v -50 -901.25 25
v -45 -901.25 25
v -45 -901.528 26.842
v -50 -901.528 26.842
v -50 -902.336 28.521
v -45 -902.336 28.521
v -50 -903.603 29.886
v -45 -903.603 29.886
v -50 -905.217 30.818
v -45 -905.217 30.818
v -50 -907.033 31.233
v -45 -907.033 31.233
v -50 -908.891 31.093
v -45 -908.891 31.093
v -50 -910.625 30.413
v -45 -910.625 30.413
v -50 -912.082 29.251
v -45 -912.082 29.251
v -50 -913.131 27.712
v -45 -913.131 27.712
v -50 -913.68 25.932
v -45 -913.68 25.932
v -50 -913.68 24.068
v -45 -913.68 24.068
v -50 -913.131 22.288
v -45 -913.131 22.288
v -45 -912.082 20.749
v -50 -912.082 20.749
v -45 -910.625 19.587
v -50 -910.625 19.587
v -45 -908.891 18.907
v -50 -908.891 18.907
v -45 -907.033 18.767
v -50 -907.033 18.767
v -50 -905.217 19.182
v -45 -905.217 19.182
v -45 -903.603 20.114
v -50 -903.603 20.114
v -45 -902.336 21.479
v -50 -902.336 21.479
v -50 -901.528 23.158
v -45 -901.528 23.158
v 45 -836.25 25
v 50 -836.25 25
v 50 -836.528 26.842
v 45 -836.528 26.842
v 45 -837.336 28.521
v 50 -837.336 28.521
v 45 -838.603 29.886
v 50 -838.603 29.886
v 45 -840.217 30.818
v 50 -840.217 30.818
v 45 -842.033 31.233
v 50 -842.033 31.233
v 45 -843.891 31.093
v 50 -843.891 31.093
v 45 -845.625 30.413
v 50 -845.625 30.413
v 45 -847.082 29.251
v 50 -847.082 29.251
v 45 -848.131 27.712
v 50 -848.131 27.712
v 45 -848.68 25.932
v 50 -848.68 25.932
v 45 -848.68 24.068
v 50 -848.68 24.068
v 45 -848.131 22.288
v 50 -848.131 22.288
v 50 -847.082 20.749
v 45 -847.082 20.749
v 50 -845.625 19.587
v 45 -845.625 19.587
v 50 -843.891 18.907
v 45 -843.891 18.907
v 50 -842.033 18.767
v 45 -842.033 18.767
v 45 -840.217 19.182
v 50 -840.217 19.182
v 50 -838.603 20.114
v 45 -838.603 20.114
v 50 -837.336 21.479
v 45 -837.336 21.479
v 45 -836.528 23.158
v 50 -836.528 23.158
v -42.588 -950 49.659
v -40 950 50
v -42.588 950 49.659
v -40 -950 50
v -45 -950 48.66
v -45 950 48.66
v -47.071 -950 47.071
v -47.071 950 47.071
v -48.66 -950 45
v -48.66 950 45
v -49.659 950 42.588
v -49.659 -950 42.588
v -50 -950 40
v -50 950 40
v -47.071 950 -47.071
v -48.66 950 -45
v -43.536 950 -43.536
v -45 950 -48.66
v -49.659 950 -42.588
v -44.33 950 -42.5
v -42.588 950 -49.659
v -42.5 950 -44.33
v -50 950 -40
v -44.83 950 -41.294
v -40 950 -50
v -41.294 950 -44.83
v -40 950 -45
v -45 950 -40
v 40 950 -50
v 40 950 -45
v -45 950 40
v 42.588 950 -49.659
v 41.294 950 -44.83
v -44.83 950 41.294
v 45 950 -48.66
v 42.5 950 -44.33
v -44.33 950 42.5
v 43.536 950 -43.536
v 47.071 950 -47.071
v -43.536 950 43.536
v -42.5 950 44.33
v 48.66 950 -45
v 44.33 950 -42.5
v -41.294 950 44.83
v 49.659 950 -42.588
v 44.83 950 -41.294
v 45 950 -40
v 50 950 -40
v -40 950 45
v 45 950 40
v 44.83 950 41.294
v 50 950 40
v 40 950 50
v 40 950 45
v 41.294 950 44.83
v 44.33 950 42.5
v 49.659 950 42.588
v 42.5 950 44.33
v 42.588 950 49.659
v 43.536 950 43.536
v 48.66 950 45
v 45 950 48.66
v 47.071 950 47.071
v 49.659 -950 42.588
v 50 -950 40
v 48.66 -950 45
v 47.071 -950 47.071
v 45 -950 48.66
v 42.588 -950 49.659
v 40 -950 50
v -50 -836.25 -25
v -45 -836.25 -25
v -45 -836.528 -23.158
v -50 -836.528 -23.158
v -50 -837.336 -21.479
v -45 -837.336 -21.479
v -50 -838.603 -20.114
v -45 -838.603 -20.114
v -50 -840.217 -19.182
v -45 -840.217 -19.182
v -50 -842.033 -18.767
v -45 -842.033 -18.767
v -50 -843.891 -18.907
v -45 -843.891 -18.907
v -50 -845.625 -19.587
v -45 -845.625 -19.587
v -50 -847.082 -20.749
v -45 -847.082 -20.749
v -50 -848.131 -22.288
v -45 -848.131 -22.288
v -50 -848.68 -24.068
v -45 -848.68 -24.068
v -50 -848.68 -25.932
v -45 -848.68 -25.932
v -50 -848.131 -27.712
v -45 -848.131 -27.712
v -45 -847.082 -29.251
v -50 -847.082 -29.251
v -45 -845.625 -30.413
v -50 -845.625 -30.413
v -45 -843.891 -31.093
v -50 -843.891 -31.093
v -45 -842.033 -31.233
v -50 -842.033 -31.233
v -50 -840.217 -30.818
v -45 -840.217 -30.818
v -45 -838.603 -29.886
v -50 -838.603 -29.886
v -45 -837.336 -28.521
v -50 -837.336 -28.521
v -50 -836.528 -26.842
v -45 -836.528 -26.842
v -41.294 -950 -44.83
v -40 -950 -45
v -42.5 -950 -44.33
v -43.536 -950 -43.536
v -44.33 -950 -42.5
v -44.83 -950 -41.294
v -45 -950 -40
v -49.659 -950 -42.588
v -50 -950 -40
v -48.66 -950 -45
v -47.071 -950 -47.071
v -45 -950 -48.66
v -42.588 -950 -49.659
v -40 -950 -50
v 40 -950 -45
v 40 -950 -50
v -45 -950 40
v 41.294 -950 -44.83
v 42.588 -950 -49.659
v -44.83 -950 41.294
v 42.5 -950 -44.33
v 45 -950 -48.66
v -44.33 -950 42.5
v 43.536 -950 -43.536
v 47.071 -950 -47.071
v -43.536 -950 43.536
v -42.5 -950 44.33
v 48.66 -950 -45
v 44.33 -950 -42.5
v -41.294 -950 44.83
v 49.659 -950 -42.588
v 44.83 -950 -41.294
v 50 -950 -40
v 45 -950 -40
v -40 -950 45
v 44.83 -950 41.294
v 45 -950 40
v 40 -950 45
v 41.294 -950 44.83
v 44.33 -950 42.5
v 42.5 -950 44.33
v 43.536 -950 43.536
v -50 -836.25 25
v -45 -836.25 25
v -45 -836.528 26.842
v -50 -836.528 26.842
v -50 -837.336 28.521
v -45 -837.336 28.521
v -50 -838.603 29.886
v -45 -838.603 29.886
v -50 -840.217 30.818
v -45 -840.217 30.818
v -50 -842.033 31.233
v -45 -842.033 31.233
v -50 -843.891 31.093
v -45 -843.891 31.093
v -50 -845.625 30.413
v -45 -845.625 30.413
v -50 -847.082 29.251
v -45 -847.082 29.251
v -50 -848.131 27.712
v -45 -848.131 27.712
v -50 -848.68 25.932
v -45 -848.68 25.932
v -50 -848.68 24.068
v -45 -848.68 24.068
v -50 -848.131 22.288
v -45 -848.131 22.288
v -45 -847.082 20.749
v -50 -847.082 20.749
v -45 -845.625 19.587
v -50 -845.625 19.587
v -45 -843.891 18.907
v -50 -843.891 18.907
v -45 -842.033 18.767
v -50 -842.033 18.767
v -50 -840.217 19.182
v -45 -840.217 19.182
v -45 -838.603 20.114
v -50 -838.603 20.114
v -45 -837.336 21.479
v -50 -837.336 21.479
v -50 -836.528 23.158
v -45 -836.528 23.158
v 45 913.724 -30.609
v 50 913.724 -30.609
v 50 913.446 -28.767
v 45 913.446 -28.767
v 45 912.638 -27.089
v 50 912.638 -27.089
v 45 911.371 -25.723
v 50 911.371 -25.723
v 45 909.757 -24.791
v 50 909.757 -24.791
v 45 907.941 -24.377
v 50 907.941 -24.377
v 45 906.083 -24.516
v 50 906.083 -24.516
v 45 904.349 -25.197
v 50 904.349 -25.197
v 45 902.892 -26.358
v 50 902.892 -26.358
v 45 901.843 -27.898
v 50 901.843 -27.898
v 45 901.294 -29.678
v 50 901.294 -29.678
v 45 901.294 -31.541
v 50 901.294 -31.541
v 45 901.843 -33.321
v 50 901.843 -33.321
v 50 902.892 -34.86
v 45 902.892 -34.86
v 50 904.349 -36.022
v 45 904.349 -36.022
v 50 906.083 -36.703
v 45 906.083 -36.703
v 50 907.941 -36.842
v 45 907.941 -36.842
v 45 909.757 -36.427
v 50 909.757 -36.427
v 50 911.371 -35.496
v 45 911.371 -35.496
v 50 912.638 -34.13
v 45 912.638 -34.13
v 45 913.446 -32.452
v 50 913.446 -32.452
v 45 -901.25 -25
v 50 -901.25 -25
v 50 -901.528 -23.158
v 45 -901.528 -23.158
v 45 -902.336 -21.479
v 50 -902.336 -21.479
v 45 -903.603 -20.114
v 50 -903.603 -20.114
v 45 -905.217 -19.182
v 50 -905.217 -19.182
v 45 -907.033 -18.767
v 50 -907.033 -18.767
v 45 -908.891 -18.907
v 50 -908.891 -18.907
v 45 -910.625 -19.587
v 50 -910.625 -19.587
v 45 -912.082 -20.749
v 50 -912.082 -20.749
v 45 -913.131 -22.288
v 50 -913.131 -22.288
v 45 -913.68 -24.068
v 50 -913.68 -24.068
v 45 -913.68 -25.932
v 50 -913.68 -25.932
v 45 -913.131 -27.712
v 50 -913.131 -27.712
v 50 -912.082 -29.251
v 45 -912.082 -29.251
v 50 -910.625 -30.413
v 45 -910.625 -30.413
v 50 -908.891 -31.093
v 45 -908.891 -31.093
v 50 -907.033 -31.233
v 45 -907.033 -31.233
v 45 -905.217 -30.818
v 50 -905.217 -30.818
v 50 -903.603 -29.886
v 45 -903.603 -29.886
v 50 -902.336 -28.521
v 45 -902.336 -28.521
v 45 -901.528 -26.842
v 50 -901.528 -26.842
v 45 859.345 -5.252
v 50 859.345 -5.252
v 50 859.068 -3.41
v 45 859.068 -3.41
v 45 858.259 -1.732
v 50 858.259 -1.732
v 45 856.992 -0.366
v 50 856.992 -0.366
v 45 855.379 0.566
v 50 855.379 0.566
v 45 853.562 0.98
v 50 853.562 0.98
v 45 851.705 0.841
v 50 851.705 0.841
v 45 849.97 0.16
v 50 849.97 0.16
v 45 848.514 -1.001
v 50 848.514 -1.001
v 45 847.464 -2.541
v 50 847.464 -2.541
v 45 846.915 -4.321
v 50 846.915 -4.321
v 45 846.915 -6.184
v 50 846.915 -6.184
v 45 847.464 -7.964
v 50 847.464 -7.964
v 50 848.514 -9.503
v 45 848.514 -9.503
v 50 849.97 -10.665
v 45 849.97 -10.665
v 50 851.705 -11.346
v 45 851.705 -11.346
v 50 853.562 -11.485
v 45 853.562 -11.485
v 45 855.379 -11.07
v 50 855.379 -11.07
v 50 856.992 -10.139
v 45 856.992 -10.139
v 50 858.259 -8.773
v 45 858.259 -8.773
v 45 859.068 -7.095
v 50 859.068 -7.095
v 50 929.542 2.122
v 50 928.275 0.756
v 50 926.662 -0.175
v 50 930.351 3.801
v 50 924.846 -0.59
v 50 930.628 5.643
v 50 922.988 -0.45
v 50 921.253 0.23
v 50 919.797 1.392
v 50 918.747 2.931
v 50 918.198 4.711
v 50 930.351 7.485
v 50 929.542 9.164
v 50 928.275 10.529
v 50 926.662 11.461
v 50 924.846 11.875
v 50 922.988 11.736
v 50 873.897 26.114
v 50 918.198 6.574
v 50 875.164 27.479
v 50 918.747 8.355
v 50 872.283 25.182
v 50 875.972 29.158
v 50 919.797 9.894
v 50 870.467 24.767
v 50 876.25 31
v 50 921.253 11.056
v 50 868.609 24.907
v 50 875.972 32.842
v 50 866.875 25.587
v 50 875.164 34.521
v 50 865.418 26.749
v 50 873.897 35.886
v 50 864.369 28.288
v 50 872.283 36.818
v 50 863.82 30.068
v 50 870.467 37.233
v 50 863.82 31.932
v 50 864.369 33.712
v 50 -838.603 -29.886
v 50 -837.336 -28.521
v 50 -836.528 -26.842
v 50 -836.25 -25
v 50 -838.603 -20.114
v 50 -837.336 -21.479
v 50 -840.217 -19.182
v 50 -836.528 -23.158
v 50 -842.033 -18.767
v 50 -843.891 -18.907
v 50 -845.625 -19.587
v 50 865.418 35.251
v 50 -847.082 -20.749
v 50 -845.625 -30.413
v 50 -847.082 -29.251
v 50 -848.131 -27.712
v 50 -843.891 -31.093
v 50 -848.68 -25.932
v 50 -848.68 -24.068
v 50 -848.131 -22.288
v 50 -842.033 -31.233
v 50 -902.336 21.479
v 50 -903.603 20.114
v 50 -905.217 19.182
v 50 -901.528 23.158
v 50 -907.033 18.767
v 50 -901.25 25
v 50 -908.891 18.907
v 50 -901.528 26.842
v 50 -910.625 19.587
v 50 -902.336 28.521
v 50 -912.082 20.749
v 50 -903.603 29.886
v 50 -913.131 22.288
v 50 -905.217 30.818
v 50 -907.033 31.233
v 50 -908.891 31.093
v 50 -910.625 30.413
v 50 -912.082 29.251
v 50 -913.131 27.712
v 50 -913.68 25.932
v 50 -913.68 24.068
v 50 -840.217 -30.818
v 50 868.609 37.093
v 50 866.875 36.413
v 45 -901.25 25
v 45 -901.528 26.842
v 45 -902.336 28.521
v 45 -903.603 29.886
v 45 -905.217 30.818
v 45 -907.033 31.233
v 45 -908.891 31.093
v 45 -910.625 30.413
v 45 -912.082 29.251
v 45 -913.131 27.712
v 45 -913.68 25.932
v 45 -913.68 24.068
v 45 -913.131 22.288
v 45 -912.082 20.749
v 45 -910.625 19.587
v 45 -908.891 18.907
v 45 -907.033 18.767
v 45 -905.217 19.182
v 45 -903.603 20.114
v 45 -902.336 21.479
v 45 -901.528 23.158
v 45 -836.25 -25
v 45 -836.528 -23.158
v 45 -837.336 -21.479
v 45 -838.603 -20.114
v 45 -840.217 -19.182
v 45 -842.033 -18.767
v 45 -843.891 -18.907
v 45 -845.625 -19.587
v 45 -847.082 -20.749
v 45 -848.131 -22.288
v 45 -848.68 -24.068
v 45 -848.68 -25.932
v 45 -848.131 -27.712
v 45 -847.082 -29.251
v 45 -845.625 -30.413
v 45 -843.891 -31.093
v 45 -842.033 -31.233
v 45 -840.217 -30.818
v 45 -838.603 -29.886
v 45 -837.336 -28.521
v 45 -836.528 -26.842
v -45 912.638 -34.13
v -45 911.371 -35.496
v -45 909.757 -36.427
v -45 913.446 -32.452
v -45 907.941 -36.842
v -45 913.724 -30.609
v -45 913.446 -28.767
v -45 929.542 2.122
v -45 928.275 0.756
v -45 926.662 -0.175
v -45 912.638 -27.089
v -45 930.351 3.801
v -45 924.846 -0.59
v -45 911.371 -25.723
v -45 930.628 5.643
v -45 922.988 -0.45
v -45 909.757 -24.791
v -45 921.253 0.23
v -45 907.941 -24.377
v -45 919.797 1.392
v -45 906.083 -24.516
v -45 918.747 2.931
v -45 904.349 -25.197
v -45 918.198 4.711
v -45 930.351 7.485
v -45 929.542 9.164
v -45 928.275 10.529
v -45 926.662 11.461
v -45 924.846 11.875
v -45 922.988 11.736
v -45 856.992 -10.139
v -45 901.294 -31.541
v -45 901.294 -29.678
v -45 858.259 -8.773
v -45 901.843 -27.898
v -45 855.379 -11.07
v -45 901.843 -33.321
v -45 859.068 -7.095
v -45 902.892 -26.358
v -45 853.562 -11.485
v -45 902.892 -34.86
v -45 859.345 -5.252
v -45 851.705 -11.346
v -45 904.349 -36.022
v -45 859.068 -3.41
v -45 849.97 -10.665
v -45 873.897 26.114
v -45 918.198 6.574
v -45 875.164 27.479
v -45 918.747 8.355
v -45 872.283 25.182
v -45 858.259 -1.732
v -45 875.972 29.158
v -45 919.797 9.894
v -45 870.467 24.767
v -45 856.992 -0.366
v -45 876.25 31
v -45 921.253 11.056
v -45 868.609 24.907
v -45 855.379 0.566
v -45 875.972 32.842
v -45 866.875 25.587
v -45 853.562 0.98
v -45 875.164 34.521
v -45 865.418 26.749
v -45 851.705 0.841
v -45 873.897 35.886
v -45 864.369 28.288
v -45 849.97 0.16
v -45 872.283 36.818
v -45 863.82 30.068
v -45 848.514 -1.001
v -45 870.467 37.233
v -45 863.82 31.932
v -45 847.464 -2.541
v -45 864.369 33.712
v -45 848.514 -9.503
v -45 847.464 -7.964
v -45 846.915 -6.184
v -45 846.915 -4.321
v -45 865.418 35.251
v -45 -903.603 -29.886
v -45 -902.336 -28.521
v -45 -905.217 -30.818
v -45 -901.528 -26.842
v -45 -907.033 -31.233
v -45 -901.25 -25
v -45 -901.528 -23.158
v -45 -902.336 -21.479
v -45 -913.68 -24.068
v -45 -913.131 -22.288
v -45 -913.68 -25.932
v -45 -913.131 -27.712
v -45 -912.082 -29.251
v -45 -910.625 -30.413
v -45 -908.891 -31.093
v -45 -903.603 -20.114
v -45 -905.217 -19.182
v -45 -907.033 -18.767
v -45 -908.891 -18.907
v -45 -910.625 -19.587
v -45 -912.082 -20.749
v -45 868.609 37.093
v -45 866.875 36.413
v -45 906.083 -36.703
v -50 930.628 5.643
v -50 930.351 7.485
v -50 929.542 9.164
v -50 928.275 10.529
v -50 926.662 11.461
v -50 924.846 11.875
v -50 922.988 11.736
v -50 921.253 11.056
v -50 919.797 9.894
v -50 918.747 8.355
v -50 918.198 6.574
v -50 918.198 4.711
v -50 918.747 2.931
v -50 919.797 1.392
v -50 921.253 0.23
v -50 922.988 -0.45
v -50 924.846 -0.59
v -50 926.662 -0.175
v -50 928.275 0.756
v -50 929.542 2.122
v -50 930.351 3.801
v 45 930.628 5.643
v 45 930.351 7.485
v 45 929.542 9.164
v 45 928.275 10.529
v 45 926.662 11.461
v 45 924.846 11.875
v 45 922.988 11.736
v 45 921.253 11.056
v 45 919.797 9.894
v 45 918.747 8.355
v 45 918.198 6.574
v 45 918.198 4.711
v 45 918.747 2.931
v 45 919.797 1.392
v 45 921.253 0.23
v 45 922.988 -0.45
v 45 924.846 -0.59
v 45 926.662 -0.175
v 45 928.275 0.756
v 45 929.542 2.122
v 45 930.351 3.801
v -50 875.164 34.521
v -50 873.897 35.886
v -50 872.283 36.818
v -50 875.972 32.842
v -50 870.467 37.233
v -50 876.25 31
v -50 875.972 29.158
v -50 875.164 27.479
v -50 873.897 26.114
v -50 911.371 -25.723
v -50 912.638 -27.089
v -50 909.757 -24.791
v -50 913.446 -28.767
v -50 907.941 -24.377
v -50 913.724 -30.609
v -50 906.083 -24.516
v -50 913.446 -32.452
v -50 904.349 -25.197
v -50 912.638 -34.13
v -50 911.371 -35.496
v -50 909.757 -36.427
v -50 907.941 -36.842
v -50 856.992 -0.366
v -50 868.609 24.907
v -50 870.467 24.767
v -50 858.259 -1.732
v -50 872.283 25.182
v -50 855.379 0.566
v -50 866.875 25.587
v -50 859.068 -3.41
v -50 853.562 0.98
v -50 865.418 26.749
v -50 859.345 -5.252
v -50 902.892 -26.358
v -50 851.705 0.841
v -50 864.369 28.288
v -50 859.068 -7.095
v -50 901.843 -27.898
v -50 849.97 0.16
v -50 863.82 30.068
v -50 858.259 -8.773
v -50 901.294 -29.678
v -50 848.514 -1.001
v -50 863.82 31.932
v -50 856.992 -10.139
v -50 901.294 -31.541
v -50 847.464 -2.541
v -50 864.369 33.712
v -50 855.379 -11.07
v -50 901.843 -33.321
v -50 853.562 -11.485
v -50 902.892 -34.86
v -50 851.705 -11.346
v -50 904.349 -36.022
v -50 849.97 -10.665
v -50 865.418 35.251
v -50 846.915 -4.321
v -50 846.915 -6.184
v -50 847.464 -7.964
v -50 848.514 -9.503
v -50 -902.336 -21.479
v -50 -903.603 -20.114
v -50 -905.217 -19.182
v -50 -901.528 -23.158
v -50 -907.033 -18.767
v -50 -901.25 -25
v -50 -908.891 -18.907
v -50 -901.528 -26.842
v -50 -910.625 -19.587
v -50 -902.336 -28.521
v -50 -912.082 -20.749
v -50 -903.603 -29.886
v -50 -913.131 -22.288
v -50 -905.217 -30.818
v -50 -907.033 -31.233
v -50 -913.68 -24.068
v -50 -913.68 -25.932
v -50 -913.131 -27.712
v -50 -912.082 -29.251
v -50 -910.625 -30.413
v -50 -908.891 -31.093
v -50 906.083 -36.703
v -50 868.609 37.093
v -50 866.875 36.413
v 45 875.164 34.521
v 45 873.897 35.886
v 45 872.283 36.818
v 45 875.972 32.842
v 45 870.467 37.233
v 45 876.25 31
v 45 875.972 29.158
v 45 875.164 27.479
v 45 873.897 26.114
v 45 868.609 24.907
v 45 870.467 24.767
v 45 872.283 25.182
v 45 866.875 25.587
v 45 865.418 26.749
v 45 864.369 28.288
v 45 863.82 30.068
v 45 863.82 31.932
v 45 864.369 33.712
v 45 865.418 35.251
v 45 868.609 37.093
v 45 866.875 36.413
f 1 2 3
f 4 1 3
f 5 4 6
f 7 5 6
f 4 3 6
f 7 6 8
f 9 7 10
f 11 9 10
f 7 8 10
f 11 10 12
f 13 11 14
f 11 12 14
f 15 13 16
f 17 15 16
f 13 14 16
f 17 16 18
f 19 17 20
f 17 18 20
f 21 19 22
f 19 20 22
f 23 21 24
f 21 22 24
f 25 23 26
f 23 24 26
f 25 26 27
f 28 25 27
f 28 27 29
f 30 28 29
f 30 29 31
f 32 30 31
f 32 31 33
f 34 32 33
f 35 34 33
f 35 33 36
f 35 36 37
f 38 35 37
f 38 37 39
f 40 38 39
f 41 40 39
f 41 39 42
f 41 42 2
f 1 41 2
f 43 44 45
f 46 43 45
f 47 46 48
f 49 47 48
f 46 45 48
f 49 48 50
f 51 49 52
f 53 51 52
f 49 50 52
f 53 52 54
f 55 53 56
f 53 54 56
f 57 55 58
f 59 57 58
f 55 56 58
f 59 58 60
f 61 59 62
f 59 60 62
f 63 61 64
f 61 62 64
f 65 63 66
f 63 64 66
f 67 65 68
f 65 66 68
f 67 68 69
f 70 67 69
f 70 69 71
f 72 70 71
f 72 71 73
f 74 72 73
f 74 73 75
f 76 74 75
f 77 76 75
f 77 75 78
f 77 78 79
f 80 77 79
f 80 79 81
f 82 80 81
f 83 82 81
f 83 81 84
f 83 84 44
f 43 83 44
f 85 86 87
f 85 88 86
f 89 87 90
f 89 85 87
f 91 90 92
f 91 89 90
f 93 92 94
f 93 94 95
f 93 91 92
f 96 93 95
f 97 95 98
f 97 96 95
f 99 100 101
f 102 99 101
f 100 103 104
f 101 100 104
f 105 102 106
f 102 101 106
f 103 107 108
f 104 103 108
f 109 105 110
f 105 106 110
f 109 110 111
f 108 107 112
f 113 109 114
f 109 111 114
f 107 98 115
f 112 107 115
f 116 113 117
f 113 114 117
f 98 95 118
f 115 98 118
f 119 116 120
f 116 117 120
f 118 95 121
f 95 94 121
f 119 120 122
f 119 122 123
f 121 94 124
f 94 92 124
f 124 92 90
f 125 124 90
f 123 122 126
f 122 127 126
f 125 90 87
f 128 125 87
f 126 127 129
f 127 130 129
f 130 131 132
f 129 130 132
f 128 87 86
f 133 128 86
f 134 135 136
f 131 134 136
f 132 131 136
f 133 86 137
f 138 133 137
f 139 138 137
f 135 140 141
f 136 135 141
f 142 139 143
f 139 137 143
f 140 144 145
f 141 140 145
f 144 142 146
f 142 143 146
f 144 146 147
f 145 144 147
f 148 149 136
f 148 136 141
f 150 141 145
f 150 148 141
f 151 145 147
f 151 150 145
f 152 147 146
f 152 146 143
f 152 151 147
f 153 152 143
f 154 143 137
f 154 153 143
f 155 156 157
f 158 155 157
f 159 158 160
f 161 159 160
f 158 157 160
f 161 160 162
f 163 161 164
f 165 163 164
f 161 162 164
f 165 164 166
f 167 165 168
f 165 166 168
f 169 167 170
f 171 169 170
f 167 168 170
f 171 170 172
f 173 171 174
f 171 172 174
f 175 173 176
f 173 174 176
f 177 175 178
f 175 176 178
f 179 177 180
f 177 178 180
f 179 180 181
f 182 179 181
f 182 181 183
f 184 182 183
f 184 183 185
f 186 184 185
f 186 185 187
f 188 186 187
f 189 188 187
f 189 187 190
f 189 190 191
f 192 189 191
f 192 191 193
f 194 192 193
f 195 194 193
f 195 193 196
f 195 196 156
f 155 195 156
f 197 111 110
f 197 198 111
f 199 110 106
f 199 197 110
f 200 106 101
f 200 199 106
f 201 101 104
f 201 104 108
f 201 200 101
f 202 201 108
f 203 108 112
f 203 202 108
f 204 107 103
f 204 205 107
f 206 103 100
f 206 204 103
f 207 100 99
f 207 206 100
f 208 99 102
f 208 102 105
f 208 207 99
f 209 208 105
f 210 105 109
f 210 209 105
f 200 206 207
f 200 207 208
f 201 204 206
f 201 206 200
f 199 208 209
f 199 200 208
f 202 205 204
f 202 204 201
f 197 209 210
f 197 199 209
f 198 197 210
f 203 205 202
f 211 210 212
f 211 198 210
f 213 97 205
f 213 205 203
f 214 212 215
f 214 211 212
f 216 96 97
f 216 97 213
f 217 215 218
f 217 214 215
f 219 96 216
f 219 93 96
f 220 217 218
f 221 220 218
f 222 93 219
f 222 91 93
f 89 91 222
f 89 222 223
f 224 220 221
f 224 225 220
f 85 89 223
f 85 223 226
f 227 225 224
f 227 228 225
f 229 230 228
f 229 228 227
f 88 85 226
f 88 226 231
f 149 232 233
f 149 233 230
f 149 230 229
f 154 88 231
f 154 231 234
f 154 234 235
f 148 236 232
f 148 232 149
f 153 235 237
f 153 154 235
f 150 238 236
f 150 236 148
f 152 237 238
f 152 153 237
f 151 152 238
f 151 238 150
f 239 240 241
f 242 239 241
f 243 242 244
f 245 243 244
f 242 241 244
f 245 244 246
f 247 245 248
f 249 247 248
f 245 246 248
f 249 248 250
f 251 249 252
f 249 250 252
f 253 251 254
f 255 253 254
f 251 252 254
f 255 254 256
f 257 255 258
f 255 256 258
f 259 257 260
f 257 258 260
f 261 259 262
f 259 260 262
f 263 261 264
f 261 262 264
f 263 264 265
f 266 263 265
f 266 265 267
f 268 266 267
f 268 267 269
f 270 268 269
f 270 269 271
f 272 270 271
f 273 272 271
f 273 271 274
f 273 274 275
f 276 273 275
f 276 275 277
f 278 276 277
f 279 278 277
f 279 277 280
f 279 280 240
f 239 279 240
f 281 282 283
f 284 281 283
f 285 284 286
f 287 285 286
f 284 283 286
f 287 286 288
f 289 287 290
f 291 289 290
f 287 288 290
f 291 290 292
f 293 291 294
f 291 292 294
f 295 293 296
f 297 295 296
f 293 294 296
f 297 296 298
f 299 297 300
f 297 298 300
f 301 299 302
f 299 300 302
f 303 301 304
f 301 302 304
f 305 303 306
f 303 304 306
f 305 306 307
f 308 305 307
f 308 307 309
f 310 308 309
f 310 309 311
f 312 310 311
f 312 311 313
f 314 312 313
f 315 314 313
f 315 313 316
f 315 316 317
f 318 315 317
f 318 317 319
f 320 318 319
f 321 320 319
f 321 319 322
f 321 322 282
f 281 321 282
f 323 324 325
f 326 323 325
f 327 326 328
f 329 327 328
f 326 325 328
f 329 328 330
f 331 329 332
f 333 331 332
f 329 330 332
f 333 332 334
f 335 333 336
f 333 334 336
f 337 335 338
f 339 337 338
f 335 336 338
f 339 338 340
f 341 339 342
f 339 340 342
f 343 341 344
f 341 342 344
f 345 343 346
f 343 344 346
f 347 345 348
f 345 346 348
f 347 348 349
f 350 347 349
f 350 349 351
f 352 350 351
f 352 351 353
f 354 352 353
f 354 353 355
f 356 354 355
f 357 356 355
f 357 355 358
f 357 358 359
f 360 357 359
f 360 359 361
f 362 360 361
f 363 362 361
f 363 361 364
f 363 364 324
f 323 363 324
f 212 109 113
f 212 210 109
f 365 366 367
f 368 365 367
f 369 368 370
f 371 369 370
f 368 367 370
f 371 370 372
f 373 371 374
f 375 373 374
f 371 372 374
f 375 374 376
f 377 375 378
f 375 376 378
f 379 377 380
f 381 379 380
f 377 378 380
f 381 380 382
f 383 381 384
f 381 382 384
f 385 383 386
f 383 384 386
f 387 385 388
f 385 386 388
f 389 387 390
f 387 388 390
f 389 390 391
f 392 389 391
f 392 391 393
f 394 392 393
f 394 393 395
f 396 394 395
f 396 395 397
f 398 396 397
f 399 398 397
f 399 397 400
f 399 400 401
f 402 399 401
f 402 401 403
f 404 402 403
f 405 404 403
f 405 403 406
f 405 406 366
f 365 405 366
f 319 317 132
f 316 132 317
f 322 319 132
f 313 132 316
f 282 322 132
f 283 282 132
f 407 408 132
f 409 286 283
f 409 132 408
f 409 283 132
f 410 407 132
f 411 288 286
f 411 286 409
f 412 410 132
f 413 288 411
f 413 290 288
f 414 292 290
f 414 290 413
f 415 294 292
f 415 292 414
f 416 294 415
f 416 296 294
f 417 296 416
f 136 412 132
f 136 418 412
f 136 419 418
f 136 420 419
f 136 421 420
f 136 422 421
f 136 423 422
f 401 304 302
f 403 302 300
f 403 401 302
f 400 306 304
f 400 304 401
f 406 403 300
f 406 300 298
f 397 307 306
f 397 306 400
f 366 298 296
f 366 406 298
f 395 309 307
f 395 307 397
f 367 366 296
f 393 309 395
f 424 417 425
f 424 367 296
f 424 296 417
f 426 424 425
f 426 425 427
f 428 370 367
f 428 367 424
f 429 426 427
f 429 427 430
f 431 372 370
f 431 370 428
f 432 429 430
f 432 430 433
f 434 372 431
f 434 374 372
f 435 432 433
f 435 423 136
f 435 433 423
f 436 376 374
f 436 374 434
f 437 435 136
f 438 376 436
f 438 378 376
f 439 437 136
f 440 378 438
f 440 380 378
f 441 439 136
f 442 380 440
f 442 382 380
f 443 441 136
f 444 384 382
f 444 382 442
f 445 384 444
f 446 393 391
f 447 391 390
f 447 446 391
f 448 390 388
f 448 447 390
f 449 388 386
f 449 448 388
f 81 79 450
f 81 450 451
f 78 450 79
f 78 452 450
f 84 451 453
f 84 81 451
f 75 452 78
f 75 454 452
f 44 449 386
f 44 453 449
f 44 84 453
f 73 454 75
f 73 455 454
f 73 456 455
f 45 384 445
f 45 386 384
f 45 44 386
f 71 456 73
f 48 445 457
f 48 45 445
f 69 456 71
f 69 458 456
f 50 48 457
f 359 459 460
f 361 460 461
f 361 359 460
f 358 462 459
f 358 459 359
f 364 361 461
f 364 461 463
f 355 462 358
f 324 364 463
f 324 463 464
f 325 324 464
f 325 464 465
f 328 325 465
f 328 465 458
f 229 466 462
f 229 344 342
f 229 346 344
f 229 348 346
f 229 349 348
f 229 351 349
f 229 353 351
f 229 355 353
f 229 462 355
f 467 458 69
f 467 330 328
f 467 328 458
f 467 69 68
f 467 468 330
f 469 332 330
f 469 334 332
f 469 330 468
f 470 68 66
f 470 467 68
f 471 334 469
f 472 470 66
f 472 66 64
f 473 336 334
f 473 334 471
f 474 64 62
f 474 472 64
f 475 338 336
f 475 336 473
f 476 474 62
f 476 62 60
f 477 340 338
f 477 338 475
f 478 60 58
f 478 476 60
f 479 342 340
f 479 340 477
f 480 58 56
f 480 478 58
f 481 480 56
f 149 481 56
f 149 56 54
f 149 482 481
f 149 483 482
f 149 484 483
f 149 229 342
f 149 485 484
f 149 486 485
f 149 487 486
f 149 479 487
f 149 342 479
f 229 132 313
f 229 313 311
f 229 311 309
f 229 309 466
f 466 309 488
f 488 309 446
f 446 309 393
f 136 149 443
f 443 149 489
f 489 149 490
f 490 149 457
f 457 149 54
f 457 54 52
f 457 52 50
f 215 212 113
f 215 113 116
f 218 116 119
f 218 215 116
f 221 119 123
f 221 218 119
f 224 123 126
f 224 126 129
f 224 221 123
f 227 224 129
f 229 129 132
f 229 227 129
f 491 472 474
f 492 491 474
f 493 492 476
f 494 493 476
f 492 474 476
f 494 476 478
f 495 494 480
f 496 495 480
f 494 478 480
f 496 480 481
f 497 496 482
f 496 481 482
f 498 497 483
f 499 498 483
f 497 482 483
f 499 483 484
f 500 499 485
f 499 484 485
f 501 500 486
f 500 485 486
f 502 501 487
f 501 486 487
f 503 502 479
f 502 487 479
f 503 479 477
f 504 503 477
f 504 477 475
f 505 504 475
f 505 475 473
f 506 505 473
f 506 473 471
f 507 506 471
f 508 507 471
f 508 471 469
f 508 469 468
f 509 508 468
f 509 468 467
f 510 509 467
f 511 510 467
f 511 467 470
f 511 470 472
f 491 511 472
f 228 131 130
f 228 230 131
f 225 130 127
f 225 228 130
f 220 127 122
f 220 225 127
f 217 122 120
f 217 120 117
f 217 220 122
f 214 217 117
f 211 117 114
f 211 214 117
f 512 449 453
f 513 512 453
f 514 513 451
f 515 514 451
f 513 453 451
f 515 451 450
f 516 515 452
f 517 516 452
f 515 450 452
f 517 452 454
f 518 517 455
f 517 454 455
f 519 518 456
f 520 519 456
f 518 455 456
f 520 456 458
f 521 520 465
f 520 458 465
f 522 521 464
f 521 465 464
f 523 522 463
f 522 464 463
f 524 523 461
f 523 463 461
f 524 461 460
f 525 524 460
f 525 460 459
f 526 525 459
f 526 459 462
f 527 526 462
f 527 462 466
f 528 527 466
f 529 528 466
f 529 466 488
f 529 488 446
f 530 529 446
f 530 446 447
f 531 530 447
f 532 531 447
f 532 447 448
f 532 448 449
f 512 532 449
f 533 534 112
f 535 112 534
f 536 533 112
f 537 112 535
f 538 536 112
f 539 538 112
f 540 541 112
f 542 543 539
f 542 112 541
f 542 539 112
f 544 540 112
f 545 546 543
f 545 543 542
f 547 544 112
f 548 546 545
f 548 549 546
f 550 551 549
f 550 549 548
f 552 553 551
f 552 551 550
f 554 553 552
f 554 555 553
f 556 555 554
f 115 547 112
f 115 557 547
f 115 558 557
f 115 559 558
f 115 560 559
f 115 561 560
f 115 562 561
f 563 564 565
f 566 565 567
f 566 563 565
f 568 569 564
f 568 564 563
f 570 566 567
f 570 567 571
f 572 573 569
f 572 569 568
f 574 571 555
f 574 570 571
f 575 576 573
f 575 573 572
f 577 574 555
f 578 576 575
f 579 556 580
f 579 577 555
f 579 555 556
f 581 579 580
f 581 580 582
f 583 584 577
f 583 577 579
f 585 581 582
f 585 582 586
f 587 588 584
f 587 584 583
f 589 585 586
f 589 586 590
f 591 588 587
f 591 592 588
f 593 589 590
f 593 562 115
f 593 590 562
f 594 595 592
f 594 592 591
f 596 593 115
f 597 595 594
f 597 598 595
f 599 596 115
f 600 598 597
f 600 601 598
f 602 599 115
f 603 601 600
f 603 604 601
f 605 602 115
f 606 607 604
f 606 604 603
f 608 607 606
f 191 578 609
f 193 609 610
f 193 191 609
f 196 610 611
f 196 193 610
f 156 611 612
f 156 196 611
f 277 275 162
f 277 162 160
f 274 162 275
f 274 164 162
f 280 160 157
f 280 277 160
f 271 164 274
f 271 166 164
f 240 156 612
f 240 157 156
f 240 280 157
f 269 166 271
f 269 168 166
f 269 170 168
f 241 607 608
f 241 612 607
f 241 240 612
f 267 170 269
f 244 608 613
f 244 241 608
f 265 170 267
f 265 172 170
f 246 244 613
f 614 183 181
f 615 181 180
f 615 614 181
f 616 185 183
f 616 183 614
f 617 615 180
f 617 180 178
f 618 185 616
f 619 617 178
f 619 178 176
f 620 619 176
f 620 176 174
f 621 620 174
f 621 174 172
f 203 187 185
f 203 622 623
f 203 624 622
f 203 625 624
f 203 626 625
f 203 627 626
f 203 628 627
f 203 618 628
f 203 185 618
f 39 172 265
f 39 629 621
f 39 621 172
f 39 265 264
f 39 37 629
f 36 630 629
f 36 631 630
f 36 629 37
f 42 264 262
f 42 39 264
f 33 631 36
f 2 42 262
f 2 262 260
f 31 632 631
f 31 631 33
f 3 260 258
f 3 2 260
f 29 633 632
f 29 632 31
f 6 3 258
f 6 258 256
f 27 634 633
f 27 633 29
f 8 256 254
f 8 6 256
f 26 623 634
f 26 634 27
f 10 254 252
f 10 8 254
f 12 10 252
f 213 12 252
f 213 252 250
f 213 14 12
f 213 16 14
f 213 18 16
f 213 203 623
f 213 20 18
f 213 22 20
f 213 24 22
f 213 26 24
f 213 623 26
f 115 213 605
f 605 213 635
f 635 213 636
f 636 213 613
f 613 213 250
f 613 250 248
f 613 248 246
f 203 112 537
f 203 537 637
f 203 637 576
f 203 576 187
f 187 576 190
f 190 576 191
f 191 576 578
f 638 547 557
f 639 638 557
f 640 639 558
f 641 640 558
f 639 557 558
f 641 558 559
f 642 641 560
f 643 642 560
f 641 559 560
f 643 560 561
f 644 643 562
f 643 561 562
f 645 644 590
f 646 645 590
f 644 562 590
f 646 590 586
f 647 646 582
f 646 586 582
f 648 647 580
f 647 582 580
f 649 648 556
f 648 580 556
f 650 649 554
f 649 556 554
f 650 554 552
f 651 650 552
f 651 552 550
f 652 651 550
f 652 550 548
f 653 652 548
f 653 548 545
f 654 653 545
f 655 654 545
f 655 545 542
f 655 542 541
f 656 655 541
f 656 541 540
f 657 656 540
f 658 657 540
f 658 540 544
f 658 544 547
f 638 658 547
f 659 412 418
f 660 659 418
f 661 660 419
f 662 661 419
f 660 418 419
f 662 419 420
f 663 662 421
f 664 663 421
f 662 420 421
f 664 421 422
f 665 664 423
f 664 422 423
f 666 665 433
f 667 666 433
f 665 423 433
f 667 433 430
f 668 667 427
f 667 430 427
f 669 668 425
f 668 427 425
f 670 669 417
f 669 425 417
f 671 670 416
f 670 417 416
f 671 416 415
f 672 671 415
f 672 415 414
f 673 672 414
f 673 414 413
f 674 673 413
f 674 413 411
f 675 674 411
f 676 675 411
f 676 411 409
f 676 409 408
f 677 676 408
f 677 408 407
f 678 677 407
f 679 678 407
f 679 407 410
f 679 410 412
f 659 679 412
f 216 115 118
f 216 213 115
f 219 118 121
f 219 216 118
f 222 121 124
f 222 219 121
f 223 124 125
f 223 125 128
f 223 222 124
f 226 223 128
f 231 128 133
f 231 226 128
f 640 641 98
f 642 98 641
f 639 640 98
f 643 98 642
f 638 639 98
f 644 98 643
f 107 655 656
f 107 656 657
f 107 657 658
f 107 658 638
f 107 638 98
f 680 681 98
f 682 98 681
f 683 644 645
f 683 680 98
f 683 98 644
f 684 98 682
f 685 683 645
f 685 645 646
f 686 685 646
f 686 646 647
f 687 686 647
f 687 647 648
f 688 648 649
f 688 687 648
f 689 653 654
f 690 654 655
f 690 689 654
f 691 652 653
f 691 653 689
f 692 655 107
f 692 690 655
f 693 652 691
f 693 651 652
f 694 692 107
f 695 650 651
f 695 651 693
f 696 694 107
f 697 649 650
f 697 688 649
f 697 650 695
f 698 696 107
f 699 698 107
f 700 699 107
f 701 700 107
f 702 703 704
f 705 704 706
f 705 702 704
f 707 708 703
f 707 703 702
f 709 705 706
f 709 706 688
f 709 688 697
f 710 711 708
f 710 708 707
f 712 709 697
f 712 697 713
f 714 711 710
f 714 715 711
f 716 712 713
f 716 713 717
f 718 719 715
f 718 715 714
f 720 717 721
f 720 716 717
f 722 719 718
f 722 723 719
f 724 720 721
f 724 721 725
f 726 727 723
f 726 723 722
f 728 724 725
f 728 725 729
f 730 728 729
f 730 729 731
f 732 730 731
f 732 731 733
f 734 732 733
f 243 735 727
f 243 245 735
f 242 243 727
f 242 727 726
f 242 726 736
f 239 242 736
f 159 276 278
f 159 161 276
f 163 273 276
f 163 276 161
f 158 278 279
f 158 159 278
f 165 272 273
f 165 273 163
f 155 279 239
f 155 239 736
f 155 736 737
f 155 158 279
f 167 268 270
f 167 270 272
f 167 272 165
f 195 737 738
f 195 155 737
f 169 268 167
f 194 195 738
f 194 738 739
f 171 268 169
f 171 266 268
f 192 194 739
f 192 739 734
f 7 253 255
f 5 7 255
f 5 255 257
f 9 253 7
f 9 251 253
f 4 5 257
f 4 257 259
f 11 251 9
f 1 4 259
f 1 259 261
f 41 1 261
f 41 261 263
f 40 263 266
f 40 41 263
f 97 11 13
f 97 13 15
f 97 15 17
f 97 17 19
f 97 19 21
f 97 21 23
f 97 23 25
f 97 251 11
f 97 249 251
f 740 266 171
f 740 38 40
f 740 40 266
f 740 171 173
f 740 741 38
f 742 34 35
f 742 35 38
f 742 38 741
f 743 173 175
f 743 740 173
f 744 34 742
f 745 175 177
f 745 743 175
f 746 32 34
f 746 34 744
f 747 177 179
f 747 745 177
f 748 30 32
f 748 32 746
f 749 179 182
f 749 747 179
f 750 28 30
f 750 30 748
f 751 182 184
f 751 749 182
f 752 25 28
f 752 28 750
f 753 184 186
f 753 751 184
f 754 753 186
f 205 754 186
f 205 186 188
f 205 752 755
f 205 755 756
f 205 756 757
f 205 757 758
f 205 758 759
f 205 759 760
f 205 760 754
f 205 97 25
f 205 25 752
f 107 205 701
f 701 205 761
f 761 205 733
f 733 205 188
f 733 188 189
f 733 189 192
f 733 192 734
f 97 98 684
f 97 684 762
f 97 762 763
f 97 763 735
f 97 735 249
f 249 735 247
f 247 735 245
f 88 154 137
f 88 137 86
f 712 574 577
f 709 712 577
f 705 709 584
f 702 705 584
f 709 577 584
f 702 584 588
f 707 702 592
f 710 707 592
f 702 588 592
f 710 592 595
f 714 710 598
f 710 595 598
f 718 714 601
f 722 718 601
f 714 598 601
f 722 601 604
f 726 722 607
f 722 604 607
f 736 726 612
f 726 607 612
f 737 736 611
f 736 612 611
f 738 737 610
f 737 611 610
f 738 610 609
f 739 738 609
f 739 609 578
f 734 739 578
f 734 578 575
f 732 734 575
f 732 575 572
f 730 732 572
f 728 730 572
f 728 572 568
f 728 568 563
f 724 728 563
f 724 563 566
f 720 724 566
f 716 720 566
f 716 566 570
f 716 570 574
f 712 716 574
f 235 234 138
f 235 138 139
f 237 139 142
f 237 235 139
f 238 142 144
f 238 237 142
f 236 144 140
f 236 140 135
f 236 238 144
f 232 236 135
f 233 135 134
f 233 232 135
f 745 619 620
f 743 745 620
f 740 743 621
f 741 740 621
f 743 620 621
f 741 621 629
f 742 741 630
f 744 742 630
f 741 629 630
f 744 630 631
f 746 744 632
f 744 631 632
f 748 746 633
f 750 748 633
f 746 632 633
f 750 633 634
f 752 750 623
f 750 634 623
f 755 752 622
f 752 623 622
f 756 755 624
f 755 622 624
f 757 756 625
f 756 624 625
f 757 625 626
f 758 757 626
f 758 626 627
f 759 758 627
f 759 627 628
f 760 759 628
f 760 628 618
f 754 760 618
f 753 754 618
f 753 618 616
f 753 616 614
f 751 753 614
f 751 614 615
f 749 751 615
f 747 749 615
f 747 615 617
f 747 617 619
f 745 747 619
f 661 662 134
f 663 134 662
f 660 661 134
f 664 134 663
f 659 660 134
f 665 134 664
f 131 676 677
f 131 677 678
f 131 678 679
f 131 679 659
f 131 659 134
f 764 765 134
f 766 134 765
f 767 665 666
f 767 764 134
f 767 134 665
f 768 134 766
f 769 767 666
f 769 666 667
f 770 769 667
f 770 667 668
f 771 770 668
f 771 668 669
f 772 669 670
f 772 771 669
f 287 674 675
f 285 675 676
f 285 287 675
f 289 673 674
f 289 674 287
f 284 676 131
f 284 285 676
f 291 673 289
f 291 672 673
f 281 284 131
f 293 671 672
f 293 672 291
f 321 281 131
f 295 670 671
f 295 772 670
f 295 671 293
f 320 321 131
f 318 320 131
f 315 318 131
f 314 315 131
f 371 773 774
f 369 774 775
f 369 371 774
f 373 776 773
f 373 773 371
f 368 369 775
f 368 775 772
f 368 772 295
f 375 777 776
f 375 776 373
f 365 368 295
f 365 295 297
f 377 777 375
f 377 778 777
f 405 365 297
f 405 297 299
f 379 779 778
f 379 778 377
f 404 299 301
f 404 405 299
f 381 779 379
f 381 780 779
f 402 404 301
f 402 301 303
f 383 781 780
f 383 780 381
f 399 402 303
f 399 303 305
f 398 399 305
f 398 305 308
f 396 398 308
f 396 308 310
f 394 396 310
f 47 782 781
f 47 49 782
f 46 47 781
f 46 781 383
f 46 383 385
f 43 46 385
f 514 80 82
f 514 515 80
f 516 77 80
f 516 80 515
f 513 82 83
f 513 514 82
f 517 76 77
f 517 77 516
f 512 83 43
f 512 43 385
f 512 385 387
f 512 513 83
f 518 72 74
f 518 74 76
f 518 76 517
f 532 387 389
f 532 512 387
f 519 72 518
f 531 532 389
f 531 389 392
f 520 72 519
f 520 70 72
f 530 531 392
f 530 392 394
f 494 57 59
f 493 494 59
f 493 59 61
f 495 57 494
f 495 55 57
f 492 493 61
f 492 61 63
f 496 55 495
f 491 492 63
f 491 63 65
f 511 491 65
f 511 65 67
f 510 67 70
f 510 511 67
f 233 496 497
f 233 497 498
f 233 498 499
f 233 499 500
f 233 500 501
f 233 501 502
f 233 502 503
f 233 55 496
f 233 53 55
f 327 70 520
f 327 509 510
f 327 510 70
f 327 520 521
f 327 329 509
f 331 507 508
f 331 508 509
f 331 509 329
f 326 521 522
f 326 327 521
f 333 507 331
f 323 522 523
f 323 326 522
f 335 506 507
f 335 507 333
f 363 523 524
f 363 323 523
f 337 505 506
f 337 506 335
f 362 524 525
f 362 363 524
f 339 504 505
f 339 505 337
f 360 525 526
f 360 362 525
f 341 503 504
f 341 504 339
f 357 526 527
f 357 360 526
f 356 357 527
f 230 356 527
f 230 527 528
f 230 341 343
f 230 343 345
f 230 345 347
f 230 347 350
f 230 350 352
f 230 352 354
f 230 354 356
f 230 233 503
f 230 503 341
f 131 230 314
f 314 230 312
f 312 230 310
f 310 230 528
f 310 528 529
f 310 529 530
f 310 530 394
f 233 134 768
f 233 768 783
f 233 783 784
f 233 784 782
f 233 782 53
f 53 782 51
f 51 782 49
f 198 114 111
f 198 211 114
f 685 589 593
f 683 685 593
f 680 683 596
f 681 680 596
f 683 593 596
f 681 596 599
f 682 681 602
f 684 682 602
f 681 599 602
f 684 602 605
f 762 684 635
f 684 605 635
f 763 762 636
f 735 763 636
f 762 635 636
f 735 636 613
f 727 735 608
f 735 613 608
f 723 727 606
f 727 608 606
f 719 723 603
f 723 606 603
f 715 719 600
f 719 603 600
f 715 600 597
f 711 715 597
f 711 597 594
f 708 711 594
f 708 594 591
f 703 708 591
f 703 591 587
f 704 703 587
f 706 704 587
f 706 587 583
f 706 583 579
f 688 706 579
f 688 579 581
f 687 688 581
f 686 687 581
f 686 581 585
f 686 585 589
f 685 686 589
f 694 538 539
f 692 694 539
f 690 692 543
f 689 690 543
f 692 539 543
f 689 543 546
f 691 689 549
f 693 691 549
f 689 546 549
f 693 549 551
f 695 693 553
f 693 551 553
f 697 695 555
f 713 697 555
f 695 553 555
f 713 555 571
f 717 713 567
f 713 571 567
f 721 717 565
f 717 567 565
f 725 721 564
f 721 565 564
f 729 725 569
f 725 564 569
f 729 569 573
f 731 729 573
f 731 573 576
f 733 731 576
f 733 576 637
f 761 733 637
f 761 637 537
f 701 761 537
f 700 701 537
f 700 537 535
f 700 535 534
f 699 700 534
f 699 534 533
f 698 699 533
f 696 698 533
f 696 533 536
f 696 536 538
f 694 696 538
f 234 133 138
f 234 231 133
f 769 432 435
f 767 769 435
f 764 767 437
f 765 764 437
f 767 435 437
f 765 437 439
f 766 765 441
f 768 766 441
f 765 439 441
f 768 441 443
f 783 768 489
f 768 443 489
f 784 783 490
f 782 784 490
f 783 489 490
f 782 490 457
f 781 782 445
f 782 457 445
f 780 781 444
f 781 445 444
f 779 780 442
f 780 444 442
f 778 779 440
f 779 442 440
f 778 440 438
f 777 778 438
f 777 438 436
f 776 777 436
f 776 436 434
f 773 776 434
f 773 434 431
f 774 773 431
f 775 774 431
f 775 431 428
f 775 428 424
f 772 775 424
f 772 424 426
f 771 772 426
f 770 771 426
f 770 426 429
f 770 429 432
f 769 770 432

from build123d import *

# Parameters (mm, degrees)
F1_DEPTH = 950
F2_R     = 6.25
F3_DEPTH = 100.001
F4_R     = 6.25
F5_DEPTH = 100.001


with BuildPart() as f1:
    # F0 (on Front) → F1 (new body, symmetric)
    with BuildSketch(Plane.XZ):
        with BuildLine():
            Line((-40, -50), (40, -50))
            ThreePointArc((40, -50), (47.071068, -47.071068), (50, -40))
            Line((50, -40), (50, 40))
            ThreePointArc((50, 40), (47.071068, 47.071068), (40, 50))
            Line((40, 50), (-40, 50))
            ThreePointArc((-40, 50), (-47.071068, 47.071068), (-50, 40))
            Line((-50, 40), (-50, -40))
            ThreePointArc((-50, -40), (-47.071068, -47.071068), (-40, -50))
        make_face()
        with BuildLine():
            ThreePointArc((40, 45), (43.535534, 43.535534), (45, 40))
            Line((45, 40), (45, -40))
            ThreePointArc((45, -40), (43.535534, -43.535534), (40, -45))
            Line((40, -45), (-40, -45))
            ThreePointArc((-40, -45), (-43.535534, -43.535534), (-45, -40))
            Line((-45, -40), (-45, 40))
            ThreePointArc((-45, 40), (-43.535534, 43.535534), (-40, 45))
            Line((-40, 45), (40, 45))
        make_face(mode=Mode.SUBTRACT)
    extrude(amount=F1_DEPTH, both=True)

    # F2 (on face) → F3 (cut, through all)
    with BuildSketch(Plane.YZ.offset(50)):
        with Locations((-907.5, 25)):
            Circle(F2_R)
        with Locations((-842.5, 25)):
            Circle(F2_R)
        with Locations((-842.5, -25)):
            Circle(F2_R)
        with Locations((-907.5, -25)):
            Circle(F2_R)
    extrude(amount=-F3_DEPTH, mode=Mode.SUBTRACT)

    # F4 (on face) → F5 (cut, through all)
    with BuildSketch(Plane.YZ.offset(50)):
        with Locations((870, 31)):
            Circle(F4_R)
        with Locations((924.378467, 5.642904)):
            Circle(F4_R)
        with Locations((907.473737, -30.609407)):
            Circle(F4_R)
        with Locations((853.09527, -5.252311)):
            Circle(F4_R)
    extrude(amount=-F5_DEPTH, mode=Mode.SUBTRACT)


solid = f1.part
